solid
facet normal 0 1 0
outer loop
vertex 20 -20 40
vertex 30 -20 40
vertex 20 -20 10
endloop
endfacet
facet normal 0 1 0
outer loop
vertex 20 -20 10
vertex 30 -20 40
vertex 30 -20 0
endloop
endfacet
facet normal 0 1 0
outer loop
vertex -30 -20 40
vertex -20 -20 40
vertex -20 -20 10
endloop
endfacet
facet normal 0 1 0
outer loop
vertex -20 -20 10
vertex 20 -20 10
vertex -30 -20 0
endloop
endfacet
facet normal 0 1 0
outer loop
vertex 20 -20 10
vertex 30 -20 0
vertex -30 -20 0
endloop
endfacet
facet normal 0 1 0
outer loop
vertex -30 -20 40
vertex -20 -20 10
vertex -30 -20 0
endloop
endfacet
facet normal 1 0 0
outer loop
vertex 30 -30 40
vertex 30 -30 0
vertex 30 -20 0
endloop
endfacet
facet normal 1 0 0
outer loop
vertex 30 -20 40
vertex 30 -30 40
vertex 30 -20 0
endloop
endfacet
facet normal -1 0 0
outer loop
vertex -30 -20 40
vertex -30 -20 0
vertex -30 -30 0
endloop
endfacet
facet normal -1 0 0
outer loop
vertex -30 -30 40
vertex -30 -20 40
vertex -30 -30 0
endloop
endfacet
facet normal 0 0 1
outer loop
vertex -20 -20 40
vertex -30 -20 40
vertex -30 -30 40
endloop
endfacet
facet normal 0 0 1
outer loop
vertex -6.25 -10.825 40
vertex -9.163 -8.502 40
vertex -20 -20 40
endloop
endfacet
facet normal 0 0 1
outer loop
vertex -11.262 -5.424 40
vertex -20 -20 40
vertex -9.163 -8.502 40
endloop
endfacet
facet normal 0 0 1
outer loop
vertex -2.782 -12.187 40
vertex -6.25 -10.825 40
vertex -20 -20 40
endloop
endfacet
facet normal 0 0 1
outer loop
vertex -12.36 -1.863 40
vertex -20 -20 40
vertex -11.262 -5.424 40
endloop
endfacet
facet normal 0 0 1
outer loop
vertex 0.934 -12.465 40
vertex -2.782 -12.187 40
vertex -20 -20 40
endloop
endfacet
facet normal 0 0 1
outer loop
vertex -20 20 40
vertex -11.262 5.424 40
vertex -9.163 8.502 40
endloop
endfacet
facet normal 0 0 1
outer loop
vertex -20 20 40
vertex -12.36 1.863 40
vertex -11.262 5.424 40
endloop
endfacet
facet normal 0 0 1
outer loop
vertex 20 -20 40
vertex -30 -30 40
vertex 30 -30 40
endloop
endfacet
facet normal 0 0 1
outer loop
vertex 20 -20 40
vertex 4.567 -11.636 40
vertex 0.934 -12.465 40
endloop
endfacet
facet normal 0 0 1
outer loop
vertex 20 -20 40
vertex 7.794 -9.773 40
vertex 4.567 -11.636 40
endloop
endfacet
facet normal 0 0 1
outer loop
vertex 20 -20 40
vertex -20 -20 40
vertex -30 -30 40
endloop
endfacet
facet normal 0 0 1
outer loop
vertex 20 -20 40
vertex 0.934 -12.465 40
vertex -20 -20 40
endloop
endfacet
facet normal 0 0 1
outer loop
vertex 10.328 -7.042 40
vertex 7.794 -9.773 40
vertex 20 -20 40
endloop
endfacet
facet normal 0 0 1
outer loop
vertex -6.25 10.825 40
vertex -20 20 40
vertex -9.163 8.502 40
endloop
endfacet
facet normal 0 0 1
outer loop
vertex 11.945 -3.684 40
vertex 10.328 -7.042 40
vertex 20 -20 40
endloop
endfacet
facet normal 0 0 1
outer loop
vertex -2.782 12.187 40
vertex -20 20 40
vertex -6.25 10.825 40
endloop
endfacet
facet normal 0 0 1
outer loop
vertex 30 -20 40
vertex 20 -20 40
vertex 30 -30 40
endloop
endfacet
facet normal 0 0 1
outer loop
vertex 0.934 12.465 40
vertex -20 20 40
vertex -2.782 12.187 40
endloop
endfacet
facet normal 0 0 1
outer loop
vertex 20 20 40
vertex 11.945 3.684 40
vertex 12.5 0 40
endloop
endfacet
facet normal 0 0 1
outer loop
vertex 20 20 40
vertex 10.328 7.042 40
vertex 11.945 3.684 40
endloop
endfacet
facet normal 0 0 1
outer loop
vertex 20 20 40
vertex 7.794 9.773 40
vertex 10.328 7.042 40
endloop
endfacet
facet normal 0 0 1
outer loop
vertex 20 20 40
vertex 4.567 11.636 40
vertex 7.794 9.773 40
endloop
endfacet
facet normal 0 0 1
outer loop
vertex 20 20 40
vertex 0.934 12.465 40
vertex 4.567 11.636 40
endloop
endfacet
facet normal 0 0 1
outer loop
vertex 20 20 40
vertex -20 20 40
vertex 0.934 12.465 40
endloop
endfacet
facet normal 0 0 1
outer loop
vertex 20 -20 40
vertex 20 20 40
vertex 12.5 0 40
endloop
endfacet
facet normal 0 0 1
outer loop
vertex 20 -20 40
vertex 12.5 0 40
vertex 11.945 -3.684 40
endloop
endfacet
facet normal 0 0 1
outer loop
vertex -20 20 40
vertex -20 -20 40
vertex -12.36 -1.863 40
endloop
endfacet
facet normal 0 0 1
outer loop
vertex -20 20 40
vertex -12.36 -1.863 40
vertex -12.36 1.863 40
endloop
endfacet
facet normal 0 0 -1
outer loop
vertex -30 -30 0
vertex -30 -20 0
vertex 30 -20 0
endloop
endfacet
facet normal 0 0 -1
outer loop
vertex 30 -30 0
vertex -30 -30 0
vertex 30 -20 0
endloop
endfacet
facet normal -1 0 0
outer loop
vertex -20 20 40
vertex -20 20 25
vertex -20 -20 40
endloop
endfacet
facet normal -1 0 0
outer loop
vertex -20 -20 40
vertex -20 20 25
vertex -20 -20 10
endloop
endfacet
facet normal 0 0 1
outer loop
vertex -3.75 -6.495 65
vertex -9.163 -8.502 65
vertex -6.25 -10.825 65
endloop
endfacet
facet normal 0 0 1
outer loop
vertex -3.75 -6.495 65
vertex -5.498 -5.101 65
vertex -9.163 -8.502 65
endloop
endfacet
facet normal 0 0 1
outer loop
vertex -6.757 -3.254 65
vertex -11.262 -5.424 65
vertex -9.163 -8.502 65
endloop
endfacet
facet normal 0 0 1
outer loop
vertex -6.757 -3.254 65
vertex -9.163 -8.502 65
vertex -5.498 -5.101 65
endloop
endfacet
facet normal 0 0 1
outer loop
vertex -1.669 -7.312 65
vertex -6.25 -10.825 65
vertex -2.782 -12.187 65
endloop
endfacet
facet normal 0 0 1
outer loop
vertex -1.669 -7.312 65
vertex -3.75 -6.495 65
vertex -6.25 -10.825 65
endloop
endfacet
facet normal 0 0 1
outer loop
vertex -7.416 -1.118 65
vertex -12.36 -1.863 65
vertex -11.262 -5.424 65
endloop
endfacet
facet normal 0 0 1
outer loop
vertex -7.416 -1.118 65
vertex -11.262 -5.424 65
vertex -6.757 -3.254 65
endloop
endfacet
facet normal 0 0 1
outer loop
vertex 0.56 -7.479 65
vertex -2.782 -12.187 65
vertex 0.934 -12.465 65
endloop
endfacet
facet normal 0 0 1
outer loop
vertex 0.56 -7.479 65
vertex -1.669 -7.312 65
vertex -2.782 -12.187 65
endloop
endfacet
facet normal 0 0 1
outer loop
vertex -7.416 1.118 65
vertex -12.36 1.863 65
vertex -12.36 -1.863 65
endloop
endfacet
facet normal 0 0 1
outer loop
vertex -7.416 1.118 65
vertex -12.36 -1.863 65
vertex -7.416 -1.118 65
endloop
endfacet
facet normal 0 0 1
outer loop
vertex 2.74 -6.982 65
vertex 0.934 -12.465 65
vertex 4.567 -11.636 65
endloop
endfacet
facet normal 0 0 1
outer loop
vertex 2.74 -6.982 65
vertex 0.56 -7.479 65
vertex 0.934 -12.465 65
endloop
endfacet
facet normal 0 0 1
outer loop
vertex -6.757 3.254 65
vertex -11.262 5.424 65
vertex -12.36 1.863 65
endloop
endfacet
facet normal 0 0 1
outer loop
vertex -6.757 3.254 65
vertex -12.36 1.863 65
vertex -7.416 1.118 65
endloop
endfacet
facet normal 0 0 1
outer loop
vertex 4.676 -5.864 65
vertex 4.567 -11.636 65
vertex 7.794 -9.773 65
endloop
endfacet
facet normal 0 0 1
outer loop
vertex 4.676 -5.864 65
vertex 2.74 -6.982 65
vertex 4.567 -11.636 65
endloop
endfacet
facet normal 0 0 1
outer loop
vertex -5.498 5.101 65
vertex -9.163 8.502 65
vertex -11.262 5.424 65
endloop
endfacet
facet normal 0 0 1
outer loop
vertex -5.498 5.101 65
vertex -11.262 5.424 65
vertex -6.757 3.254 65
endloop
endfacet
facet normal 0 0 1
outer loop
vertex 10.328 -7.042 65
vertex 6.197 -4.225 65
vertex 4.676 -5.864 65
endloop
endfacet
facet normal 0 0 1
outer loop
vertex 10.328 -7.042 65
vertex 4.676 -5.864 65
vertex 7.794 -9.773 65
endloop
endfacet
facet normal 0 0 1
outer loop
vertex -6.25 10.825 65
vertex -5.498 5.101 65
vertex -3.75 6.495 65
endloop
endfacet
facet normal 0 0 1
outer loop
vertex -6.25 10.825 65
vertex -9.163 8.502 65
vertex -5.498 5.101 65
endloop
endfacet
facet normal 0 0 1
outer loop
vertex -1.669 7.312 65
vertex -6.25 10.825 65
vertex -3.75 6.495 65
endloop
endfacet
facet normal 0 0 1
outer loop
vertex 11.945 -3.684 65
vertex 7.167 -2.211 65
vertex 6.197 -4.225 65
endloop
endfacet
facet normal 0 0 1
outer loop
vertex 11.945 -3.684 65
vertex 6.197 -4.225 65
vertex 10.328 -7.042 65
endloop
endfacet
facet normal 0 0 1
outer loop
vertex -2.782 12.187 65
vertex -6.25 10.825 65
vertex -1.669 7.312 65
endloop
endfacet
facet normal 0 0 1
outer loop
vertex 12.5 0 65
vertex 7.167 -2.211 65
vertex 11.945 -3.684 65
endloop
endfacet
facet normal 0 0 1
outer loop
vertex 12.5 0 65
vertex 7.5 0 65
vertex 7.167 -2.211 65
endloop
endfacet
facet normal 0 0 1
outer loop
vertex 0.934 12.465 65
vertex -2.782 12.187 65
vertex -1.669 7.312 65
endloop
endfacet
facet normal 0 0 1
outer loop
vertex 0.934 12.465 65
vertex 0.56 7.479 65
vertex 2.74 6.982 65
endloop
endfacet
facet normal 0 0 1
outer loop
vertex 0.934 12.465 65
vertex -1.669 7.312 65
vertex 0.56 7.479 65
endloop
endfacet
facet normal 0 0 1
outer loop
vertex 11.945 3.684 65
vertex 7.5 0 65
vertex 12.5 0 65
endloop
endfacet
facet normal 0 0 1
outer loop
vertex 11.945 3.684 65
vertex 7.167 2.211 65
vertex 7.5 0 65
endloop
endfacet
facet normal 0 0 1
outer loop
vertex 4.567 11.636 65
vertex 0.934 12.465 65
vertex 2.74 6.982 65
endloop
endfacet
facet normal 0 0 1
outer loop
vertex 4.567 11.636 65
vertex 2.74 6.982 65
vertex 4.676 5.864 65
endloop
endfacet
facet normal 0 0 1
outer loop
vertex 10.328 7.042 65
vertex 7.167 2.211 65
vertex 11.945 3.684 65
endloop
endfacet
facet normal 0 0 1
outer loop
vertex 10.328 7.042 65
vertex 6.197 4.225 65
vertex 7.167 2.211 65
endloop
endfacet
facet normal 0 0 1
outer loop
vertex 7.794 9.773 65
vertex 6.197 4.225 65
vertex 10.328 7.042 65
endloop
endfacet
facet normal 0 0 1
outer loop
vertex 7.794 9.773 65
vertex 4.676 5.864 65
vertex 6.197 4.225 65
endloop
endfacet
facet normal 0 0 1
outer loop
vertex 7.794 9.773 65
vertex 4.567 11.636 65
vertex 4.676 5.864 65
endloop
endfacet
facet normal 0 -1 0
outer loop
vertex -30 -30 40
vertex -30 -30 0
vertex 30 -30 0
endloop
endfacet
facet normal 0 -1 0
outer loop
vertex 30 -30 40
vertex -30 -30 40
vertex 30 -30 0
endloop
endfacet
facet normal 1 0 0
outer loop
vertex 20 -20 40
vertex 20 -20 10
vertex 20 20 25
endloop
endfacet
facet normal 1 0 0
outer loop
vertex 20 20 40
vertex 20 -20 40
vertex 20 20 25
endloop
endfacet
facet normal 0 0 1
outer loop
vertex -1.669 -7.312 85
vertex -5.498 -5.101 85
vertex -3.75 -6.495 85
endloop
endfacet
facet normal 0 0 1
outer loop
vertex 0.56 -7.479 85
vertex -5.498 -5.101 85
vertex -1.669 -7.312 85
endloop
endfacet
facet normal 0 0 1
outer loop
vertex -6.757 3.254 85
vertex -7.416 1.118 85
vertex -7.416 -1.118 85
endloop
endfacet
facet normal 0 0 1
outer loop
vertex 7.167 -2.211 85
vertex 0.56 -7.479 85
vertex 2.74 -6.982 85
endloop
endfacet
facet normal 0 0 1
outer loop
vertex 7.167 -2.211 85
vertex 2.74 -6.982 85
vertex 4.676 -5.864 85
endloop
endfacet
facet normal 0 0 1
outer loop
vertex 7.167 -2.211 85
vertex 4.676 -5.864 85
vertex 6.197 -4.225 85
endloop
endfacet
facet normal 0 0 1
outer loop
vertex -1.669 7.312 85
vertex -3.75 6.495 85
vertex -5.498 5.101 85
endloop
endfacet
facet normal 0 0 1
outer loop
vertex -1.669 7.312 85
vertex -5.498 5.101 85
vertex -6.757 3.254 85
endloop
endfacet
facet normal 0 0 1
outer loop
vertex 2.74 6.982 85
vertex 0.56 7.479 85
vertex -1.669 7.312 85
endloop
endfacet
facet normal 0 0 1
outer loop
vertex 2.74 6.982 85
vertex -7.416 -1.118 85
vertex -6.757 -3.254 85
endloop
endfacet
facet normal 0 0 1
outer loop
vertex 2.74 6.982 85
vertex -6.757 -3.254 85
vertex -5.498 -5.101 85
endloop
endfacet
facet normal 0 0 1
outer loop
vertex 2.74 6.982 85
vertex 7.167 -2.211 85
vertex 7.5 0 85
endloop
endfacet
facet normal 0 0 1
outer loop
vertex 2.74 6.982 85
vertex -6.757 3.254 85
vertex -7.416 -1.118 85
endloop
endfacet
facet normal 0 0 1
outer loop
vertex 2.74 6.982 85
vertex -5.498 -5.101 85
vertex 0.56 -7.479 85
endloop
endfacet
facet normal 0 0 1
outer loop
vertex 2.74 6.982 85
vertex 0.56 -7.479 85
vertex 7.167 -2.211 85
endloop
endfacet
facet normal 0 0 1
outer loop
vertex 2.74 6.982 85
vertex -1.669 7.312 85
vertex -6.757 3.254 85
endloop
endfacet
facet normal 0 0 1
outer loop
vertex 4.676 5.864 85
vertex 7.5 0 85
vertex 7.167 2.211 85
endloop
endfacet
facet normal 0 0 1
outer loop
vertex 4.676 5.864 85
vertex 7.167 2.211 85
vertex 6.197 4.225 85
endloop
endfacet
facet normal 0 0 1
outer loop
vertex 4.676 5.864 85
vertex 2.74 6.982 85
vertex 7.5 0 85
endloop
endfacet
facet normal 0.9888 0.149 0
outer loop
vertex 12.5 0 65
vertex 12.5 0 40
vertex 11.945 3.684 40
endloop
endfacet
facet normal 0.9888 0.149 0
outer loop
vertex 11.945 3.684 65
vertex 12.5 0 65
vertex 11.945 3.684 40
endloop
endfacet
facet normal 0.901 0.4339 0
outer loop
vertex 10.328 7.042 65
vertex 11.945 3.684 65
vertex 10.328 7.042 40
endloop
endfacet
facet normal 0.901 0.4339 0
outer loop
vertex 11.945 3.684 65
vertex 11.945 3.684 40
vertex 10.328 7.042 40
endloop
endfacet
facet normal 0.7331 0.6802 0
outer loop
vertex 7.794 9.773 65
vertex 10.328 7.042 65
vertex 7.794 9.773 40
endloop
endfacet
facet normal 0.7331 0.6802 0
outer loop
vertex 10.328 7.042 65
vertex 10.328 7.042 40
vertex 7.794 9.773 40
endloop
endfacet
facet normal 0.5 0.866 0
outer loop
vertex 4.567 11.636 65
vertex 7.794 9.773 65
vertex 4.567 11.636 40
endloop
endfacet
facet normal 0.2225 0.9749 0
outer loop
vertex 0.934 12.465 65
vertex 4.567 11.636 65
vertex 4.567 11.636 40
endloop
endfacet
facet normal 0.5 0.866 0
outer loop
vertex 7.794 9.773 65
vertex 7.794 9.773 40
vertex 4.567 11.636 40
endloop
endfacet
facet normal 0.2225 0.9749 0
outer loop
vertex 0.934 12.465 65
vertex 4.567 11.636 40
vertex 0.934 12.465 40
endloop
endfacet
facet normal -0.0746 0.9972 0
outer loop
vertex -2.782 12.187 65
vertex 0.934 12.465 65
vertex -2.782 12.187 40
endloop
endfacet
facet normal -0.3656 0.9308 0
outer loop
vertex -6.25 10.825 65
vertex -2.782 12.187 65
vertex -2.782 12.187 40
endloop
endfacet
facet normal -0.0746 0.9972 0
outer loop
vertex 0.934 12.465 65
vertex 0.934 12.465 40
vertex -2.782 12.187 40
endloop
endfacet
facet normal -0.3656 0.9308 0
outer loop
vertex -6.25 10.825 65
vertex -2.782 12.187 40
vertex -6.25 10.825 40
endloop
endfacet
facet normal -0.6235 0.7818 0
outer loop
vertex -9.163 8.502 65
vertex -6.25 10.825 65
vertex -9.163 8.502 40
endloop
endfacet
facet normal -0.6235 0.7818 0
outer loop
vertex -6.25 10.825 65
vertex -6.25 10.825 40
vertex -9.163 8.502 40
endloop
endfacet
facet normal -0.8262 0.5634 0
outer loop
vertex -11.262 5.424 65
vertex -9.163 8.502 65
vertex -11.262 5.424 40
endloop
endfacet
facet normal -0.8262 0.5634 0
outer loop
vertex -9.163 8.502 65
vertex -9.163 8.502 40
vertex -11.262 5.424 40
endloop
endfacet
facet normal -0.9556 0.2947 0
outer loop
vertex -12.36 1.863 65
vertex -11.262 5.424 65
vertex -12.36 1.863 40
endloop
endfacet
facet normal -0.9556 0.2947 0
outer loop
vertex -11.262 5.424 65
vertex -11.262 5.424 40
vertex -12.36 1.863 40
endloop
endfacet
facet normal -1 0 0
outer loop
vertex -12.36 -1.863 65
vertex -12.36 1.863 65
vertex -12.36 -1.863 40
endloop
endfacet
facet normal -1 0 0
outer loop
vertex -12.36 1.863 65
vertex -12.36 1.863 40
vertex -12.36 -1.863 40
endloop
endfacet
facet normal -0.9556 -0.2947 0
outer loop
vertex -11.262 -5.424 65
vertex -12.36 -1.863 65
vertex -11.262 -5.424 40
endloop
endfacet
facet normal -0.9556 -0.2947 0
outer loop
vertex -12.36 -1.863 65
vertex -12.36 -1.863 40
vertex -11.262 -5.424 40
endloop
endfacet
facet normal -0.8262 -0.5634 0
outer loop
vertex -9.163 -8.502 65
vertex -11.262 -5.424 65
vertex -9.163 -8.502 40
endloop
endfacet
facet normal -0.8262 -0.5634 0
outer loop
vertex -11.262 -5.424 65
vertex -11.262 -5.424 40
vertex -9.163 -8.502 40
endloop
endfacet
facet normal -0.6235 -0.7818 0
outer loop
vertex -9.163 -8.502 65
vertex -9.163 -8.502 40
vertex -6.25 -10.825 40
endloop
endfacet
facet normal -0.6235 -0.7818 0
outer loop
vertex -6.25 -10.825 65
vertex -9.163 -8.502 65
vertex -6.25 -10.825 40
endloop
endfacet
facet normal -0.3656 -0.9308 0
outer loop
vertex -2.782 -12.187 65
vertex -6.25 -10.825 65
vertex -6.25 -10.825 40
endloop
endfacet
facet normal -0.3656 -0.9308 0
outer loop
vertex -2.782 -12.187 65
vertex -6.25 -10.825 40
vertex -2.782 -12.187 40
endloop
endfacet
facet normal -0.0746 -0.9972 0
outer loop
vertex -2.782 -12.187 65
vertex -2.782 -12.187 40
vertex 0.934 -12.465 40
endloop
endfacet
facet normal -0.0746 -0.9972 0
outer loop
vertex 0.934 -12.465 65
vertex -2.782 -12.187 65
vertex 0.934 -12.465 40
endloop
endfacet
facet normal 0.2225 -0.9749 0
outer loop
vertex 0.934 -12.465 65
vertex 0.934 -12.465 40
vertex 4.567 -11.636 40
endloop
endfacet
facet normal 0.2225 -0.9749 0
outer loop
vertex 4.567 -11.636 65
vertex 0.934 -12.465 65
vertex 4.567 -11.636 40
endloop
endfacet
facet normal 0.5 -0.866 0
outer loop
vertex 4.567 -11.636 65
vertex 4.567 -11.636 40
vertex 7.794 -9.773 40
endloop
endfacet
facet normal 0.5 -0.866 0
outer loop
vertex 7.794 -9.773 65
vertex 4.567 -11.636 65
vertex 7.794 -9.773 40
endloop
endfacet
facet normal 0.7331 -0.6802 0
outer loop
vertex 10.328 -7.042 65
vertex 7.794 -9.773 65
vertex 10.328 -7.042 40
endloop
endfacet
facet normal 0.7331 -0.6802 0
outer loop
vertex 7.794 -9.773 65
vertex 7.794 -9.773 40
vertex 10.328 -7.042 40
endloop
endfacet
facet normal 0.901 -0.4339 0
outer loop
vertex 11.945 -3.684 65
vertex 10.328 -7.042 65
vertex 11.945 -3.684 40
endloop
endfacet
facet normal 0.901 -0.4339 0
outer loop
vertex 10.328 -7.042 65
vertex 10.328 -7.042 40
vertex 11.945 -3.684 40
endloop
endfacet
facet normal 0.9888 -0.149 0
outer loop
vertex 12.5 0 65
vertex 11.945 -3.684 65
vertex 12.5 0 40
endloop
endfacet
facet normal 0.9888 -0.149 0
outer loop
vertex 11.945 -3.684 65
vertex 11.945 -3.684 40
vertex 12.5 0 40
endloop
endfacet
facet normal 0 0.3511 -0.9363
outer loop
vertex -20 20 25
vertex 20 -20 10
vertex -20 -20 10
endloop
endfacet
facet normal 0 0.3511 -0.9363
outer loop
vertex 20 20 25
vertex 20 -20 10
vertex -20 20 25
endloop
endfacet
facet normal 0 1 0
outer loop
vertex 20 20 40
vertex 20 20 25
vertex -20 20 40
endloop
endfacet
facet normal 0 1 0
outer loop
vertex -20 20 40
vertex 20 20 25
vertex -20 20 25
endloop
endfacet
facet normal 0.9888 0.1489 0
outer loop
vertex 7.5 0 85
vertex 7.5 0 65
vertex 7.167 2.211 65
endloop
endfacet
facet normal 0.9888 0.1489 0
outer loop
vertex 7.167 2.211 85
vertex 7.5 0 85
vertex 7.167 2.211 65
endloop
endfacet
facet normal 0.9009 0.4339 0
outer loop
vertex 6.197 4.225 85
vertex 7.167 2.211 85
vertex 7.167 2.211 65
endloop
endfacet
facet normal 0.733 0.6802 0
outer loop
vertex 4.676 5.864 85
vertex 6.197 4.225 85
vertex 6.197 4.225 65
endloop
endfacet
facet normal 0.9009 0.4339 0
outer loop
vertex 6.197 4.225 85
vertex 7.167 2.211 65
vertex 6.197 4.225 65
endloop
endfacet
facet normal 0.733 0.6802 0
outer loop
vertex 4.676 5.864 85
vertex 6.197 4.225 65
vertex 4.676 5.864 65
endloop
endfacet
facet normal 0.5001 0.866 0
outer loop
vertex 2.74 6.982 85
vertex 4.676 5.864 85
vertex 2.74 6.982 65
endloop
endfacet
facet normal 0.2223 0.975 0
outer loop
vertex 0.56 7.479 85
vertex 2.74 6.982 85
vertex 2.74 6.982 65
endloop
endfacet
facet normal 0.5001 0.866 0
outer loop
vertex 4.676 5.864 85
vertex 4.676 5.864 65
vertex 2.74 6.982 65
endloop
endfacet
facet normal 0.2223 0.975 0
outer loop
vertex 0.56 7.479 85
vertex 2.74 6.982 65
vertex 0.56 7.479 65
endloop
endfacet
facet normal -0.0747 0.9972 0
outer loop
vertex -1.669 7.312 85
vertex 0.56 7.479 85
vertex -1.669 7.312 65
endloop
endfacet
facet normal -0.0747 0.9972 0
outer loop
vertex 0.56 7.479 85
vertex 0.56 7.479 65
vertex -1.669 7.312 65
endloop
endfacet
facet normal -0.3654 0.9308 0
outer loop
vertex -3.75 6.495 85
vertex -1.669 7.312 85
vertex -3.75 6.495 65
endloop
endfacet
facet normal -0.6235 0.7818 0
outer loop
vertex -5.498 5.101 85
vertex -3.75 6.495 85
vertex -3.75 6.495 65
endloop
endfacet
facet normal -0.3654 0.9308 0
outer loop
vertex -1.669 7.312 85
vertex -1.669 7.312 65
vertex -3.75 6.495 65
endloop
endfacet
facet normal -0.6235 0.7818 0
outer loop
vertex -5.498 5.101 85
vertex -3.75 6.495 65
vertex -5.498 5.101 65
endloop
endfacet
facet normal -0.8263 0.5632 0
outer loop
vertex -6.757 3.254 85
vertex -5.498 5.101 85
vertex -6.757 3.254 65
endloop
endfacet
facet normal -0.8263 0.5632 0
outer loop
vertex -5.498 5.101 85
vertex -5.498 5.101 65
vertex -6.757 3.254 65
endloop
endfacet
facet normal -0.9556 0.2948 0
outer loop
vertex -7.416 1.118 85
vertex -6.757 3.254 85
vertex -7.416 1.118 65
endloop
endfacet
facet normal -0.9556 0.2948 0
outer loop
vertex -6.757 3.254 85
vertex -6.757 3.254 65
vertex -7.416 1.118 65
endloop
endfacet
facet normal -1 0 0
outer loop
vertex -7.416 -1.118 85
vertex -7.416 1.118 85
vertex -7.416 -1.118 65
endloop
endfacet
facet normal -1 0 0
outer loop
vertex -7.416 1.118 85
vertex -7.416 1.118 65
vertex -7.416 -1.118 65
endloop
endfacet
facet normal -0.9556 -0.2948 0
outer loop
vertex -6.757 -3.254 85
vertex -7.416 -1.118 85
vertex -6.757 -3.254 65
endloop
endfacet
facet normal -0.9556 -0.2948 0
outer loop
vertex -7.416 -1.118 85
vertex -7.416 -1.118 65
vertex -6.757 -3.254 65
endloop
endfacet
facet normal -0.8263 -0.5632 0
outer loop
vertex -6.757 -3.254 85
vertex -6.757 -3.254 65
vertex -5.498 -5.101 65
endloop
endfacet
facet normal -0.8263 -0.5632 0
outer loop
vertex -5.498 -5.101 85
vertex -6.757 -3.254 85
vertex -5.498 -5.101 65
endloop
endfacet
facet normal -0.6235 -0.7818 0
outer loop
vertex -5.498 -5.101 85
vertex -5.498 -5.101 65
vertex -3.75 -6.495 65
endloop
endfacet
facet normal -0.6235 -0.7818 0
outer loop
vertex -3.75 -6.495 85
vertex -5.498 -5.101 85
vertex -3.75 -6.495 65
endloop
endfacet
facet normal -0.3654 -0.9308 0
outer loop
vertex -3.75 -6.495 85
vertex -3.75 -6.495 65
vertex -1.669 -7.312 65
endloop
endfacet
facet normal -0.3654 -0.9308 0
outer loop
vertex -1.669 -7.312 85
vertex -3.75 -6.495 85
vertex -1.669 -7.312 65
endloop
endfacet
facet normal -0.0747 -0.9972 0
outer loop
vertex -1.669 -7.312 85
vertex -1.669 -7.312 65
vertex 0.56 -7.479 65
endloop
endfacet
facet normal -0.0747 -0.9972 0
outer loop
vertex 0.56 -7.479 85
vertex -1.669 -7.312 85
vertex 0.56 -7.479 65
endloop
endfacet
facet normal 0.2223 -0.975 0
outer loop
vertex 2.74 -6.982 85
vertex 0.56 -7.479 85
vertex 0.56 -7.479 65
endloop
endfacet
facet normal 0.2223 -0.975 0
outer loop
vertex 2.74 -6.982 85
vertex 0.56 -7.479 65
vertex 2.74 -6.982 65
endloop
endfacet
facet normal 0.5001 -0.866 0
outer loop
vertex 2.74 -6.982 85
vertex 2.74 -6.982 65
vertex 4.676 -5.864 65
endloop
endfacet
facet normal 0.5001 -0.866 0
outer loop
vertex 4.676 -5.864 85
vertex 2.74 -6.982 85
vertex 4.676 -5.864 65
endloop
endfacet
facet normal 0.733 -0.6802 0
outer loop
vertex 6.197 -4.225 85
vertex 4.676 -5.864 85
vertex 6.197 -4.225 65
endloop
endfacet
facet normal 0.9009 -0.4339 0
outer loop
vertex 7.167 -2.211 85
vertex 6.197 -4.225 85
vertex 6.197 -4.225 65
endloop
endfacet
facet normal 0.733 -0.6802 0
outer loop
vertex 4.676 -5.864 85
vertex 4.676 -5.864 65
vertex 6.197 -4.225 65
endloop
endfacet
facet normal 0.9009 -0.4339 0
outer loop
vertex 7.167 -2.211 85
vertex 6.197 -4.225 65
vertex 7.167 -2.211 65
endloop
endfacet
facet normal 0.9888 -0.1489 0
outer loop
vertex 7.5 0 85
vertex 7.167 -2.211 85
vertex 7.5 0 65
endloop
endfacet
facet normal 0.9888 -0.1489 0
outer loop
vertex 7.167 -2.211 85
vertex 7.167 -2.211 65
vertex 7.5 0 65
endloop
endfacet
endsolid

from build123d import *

# Parameters (mm, degrees)
EXTRUDE_1_DEPTH     = 40
CUT_EXTRUDE_1_DEPTH = 40
SKETCH_3_R          = 12.5
EXTRUDE_2_DEPTH     = 25
SKETCH_4_R          = 7.5
EXTRUDE_3_DEPTH     = 20


with BuildPart() as part:
    # 草图1 → 凸台-拉伸1 (new body)
    with BuildSketch(Plane.XY):
        Polygon((-20, -20), (-30, -20), (-30, -30), (30, -30), (30, -20), (20, -20), (20, 20), (-20, 20), align=None)
    extrude(amount=EXTRUDE_1_DEPTH)

    # 草图2 → 切除-拉伸1 (cut)
    with BuildSketch(Plane(origin=(20, 0, 0), x_dir=(0, 0, -1), z_dir=(1, 0, 0))):
        Polygon((0, -20), (-10, -20), (-25, 20), (0, 20), align=None)
    extrude(amount=-CUT_EXTRUDE_1_DEPTH, mode=Mode.SUBTRACT)

    # 草图3 → 凸台-拉伸2 (add)
    with BuildSketch(Plane.XY.offset(40)):
        Circle(SKETCH_3_R)
    extrude(amount=EXTRUDE_2_DEPTH)

    # 草图4 → 凸台-拉伸3 (add)
    with BuildSketch(Plane.XY.offset(65)):
        Circle(SKETCH_4_R)
    extrude(amount=EXTRUDE_3_DEPTH)


solid = part.part
